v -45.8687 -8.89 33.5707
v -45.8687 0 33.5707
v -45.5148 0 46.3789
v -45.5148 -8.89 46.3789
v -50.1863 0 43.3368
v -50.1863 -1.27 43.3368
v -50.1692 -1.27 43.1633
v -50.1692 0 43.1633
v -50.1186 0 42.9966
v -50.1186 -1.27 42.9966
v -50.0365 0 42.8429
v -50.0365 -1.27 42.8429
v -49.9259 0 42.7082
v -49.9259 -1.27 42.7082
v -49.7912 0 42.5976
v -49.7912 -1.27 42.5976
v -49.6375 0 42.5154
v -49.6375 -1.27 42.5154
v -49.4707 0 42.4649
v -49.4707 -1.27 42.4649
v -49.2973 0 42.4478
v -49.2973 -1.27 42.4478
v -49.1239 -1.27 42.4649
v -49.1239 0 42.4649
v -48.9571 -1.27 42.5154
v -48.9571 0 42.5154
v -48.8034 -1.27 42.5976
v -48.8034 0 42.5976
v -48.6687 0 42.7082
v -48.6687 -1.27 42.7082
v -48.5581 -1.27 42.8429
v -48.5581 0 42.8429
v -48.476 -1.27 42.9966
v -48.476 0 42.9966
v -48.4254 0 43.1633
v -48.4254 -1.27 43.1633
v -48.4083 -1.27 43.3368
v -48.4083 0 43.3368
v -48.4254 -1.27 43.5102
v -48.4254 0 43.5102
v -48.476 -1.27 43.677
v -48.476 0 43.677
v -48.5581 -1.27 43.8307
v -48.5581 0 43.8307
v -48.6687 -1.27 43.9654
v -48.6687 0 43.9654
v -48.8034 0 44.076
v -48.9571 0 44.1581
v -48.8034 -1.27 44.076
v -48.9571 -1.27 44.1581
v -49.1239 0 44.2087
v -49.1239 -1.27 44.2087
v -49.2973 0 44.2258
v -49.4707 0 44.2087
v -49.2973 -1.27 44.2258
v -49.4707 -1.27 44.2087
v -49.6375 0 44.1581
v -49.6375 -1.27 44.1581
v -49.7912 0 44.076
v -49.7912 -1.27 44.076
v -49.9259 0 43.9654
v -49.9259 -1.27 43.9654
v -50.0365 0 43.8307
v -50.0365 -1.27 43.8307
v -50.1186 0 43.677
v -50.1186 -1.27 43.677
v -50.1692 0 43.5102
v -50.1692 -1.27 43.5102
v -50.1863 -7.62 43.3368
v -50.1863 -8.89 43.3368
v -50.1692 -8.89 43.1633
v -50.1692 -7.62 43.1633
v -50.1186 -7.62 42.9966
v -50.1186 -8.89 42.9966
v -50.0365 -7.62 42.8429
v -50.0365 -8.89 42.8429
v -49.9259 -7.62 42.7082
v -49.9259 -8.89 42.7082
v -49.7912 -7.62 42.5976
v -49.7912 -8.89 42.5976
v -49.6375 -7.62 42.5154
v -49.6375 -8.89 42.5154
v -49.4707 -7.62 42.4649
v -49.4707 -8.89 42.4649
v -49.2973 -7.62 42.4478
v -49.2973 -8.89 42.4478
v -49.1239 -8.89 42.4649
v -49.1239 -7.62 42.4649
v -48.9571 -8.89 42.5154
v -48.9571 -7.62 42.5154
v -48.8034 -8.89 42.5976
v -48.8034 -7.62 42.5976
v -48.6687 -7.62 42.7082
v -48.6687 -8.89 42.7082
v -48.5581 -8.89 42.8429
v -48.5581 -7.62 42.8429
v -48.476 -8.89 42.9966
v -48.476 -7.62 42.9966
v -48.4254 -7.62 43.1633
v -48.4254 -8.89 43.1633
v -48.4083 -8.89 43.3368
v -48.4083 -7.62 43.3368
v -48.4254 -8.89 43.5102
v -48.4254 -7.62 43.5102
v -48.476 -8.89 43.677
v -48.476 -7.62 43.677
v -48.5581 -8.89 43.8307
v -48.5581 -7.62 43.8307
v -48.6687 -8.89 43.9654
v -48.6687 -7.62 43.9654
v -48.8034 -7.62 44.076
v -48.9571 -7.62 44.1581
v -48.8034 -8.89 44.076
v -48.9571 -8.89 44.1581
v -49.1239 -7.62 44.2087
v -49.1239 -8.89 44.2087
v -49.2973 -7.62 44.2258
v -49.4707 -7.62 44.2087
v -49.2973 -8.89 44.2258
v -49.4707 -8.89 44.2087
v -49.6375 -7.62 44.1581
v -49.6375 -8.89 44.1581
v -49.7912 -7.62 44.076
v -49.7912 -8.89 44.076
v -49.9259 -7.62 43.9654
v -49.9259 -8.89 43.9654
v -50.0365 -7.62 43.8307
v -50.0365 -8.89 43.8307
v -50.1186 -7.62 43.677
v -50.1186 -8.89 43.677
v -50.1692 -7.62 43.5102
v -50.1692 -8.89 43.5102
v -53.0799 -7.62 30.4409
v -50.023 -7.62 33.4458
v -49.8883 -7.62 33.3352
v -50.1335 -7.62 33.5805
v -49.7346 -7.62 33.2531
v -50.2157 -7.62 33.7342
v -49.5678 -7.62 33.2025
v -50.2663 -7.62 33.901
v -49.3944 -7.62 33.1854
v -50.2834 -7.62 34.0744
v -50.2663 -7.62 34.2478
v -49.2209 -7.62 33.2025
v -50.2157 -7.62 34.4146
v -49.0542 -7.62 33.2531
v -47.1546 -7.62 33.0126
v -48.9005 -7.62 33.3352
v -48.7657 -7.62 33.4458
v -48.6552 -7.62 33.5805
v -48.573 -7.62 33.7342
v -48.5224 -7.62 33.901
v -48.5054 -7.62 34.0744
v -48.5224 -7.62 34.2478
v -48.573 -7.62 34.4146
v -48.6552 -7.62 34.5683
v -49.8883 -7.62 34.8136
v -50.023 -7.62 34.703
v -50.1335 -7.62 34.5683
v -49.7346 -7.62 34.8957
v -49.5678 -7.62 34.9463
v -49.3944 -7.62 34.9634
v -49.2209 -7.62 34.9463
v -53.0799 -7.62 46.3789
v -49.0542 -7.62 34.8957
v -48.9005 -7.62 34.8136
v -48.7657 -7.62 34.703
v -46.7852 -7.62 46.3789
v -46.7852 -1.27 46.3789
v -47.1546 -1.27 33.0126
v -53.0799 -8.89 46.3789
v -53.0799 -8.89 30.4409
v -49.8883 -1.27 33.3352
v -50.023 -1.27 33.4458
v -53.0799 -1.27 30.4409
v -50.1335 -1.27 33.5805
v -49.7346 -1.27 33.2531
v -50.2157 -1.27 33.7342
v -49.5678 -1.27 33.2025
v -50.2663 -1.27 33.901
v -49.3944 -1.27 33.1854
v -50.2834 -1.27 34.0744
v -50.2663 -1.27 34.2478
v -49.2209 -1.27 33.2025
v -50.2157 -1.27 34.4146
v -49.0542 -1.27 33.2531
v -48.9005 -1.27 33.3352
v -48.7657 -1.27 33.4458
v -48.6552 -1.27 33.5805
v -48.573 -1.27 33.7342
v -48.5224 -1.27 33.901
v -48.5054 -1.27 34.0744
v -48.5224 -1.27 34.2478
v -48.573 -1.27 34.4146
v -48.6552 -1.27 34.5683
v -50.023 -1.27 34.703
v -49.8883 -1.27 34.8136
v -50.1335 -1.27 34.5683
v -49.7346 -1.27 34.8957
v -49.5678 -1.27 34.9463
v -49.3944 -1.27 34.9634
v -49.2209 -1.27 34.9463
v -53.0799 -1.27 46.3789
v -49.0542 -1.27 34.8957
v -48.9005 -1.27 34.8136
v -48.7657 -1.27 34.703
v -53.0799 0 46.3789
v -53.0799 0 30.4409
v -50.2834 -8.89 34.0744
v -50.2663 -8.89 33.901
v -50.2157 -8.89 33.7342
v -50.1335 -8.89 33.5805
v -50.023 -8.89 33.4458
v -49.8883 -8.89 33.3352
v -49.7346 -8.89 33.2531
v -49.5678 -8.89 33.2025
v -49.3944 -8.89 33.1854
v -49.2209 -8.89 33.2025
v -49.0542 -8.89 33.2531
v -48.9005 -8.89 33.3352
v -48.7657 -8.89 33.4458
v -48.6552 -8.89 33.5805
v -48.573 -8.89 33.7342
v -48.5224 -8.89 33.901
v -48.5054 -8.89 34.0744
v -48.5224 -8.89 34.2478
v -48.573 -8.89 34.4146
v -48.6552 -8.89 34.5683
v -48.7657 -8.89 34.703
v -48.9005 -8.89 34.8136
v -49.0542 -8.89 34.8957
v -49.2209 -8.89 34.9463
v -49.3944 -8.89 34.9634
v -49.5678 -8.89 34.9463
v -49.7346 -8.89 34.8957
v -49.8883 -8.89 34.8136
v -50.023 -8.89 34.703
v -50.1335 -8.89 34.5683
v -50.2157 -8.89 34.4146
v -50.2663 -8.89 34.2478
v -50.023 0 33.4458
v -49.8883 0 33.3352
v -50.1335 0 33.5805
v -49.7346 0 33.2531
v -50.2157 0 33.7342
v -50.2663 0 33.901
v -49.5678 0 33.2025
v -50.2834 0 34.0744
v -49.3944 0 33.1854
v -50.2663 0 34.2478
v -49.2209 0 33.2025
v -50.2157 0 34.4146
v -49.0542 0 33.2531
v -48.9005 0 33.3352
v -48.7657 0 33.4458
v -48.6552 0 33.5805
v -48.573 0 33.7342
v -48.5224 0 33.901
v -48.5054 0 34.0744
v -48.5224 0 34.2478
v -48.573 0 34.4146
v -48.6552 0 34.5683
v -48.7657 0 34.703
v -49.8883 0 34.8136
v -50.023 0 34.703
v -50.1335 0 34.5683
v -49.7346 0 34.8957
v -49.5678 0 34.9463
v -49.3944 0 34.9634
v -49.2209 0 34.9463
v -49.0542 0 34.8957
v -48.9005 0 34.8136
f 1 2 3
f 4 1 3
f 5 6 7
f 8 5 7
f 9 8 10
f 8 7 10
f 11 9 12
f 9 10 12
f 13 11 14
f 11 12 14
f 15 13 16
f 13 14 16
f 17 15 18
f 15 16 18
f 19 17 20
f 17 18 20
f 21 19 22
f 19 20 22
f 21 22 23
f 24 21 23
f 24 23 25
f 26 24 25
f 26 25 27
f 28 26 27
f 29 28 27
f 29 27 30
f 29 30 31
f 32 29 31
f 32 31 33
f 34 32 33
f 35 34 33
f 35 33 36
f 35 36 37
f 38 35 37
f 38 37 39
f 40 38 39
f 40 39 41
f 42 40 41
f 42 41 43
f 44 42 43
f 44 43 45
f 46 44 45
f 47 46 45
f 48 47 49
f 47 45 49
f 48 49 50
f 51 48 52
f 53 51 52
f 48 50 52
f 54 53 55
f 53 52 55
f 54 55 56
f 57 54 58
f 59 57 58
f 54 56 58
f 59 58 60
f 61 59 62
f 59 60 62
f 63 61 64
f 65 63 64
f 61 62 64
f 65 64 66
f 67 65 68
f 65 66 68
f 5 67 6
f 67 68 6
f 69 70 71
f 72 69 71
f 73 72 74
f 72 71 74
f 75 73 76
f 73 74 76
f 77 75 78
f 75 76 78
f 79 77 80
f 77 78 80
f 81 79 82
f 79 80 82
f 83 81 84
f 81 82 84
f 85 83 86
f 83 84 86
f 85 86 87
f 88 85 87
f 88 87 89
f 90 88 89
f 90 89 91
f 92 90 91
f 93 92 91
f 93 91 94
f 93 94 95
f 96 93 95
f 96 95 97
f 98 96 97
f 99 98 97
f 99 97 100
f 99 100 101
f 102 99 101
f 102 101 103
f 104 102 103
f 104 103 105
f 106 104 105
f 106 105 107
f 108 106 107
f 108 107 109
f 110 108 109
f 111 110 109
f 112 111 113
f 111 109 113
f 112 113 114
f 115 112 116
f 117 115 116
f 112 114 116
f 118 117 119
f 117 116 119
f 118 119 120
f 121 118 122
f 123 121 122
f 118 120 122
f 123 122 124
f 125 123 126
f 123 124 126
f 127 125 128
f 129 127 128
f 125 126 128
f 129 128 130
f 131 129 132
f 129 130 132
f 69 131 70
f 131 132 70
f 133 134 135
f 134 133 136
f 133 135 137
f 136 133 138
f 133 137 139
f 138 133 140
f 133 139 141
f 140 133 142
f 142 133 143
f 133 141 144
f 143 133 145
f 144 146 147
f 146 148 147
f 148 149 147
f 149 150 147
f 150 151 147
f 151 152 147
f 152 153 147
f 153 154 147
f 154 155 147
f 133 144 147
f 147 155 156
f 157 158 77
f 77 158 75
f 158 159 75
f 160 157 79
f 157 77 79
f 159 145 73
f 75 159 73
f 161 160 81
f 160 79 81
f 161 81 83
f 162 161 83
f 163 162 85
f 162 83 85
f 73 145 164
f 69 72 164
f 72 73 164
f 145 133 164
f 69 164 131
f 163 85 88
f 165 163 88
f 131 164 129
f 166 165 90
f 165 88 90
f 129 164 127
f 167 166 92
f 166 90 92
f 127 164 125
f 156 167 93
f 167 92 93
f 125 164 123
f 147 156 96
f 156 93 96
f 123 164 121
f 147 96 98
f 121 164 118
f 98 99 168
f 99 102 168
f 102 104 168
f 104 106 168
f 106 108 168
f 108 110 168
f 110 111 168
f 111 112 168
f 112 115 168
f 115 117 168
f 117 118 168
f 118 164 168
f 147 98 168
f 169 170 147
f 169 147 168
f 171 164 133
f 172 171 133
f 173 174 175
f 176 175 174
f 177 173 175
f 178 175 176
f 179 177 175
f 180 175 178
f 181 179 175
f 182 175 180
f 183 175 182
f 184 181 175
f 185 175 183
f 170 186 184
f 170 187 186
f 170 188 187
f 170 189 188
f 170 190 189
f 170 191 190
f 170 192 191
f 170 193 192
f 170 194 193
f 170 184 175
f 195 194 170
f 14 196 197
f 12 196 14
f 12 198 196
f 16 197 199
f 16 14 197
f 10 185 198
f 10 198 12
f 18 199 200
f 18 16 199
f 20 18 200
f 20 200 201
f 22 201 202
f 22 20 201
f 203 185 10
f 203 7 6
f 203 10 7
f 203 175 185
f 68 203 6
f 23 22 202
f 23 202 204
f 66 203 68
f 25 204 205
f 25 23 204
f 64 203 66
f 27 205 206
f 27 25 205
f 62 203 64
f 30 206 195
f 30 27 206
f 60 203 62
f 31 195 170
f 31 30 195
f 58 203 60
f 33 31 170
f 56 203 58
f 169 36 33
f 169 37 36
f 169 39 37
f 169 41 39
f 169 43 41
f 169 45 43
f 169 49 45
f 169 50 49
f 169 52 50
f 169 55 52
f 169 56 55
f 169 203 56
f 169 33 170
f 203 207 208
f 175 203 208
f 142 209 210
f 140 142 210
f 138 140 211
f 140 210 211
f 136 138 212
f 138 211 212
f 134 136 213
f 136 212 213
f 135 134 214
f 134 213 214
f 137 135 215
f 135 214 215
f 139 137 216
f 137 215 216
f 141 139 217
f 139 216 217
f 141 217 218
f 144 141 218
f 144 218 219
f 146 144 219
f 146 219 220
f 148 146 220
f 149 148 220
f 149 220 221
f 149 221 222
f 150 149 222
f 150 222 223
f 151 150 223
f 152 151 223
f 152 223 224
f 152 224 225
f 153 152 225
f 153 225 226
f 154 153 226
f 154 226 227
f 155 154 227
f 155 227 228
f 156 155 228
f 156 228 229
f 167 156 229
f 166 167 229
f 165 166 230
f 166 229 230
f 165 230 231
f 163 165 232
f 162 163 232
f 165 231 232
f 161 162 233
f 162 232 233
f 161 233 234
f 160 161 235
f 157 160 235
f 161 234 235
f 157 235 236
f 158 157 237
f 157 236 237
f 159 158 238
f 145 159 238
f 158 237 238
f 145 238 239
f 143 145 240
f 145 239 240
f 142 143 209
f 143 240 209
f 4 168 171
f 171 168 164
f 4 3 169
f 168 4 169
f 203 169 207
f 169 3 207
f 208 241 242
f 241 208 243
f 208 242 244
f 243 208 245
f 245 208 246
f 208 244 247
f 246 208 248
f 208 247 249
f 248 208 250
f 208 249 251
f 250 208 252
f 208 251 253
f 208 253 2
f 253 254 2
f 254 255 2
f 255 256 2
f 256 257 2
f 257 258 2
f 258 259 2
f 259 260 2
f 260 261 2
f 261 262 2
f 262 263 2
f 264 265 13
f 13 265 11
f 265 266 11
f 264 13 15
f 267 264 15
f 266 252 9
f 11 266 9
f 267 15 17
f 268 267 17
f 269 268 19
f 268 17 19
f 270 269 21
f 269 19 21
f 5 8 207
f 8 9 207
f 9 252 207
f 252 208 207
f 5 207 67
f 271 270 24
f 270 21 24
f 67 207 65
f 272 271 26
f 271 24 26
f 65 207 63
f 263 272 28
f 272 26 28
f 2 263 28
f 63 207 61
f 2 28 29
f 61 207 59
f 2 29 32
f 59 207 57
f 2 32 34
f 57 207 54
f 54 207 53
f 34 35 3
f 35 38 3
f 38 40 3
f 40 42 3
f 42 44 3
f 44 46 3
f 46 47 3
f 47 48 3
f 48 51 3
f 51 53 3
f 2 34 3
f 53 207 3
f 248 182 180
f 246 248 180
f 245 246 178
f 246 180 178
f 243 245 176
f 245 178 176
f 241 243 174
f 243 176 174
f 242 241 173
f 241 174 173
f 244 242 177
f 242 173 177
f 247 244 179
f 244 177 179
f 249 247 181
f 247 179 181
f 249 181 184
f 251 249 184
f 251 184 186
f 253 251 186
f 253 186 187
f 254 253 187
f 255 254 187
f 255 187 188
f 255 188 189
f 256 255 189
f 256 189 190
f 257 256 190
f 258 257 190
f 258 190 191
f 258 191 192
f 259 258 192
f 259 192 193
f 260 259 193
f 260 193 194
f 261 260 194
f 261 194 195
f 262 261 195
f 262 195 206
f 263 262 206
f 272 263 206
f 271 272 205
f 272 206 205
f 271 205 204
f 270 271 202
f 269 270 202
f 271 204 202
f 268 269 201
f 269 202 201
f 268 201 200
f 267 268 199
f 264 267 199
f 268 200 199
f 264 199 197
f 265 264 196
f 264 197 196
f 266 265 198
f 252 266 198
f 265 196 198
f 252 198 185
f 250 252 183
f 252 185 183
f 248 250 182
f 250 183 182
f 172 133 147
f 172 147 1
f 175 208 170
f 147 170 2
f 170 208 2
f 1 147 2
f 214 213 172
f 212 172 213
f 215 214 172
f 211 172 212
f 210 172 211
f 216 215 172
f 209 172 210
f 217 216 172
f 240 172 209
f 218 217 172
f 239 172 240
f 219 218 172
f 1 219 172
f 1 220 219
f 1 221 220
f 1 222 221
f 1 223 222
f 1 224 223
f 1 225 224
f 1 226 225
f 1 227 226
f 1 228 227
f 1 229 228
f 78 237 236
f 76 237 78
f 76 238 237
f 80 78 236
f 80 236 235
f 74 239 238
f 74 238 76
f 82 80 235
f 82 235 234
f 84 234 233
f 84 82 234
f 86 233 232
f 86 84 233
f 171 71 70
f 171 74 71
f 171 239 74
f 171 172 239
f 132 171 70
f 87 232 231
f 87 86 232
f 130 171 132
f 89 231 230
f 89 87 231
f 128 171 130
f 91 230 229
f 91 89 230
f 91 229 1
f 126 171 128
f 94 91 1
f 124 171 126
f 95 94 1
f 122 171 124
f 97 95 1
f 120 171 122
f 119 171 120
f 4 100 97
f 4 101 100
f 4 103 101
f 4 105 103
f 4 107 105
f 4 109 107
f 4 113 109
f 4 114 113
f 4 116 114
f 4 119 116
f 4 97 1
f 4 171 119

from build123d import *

# Parameters (mm, degrees)
F1_DEPTH = 8.89
F2_T     = -1.27
F3_D     = 1.778


# Not quite as in the source:
# - a feature names something its author has since deleted; it is built from what else it names


with BuildPart() as f1:
    # F0 (on Front) → F1 (new body)
    with BuildSketch(Plane.XZ):
        Polygon((-45.8687357605, 33.5707478225), (-45.5147512257, 46.3788583875), (-53.0798770487, 46.3788583875), (-53.0798770487, 30.4408613592), align=None)
    extrude(amount=F1_DEPTH)

    # F2
    f2_openings = [f1.faces().sort_by_distance(p)[0] for p in [
        (-49.297314, -4.445, 46.378858),
        (-53.079877, -4.445, 38.40986),
        (-49.474306, -4.445, 32.005805),
    ]]
    offset(amount=F2_T, openings=f2_openings)

    # F3 (through all)
    with Locations(Plane(origin=(0, 0, 0), x_dir=(1, 0, 0), z_dir=(0, 1, 0))):
        with Locations((-49.2973141372, -43.3367788792), (-49.3943579495, -34.0744107962)):
            Hole(F3_D / 2)


solid = f1.part
